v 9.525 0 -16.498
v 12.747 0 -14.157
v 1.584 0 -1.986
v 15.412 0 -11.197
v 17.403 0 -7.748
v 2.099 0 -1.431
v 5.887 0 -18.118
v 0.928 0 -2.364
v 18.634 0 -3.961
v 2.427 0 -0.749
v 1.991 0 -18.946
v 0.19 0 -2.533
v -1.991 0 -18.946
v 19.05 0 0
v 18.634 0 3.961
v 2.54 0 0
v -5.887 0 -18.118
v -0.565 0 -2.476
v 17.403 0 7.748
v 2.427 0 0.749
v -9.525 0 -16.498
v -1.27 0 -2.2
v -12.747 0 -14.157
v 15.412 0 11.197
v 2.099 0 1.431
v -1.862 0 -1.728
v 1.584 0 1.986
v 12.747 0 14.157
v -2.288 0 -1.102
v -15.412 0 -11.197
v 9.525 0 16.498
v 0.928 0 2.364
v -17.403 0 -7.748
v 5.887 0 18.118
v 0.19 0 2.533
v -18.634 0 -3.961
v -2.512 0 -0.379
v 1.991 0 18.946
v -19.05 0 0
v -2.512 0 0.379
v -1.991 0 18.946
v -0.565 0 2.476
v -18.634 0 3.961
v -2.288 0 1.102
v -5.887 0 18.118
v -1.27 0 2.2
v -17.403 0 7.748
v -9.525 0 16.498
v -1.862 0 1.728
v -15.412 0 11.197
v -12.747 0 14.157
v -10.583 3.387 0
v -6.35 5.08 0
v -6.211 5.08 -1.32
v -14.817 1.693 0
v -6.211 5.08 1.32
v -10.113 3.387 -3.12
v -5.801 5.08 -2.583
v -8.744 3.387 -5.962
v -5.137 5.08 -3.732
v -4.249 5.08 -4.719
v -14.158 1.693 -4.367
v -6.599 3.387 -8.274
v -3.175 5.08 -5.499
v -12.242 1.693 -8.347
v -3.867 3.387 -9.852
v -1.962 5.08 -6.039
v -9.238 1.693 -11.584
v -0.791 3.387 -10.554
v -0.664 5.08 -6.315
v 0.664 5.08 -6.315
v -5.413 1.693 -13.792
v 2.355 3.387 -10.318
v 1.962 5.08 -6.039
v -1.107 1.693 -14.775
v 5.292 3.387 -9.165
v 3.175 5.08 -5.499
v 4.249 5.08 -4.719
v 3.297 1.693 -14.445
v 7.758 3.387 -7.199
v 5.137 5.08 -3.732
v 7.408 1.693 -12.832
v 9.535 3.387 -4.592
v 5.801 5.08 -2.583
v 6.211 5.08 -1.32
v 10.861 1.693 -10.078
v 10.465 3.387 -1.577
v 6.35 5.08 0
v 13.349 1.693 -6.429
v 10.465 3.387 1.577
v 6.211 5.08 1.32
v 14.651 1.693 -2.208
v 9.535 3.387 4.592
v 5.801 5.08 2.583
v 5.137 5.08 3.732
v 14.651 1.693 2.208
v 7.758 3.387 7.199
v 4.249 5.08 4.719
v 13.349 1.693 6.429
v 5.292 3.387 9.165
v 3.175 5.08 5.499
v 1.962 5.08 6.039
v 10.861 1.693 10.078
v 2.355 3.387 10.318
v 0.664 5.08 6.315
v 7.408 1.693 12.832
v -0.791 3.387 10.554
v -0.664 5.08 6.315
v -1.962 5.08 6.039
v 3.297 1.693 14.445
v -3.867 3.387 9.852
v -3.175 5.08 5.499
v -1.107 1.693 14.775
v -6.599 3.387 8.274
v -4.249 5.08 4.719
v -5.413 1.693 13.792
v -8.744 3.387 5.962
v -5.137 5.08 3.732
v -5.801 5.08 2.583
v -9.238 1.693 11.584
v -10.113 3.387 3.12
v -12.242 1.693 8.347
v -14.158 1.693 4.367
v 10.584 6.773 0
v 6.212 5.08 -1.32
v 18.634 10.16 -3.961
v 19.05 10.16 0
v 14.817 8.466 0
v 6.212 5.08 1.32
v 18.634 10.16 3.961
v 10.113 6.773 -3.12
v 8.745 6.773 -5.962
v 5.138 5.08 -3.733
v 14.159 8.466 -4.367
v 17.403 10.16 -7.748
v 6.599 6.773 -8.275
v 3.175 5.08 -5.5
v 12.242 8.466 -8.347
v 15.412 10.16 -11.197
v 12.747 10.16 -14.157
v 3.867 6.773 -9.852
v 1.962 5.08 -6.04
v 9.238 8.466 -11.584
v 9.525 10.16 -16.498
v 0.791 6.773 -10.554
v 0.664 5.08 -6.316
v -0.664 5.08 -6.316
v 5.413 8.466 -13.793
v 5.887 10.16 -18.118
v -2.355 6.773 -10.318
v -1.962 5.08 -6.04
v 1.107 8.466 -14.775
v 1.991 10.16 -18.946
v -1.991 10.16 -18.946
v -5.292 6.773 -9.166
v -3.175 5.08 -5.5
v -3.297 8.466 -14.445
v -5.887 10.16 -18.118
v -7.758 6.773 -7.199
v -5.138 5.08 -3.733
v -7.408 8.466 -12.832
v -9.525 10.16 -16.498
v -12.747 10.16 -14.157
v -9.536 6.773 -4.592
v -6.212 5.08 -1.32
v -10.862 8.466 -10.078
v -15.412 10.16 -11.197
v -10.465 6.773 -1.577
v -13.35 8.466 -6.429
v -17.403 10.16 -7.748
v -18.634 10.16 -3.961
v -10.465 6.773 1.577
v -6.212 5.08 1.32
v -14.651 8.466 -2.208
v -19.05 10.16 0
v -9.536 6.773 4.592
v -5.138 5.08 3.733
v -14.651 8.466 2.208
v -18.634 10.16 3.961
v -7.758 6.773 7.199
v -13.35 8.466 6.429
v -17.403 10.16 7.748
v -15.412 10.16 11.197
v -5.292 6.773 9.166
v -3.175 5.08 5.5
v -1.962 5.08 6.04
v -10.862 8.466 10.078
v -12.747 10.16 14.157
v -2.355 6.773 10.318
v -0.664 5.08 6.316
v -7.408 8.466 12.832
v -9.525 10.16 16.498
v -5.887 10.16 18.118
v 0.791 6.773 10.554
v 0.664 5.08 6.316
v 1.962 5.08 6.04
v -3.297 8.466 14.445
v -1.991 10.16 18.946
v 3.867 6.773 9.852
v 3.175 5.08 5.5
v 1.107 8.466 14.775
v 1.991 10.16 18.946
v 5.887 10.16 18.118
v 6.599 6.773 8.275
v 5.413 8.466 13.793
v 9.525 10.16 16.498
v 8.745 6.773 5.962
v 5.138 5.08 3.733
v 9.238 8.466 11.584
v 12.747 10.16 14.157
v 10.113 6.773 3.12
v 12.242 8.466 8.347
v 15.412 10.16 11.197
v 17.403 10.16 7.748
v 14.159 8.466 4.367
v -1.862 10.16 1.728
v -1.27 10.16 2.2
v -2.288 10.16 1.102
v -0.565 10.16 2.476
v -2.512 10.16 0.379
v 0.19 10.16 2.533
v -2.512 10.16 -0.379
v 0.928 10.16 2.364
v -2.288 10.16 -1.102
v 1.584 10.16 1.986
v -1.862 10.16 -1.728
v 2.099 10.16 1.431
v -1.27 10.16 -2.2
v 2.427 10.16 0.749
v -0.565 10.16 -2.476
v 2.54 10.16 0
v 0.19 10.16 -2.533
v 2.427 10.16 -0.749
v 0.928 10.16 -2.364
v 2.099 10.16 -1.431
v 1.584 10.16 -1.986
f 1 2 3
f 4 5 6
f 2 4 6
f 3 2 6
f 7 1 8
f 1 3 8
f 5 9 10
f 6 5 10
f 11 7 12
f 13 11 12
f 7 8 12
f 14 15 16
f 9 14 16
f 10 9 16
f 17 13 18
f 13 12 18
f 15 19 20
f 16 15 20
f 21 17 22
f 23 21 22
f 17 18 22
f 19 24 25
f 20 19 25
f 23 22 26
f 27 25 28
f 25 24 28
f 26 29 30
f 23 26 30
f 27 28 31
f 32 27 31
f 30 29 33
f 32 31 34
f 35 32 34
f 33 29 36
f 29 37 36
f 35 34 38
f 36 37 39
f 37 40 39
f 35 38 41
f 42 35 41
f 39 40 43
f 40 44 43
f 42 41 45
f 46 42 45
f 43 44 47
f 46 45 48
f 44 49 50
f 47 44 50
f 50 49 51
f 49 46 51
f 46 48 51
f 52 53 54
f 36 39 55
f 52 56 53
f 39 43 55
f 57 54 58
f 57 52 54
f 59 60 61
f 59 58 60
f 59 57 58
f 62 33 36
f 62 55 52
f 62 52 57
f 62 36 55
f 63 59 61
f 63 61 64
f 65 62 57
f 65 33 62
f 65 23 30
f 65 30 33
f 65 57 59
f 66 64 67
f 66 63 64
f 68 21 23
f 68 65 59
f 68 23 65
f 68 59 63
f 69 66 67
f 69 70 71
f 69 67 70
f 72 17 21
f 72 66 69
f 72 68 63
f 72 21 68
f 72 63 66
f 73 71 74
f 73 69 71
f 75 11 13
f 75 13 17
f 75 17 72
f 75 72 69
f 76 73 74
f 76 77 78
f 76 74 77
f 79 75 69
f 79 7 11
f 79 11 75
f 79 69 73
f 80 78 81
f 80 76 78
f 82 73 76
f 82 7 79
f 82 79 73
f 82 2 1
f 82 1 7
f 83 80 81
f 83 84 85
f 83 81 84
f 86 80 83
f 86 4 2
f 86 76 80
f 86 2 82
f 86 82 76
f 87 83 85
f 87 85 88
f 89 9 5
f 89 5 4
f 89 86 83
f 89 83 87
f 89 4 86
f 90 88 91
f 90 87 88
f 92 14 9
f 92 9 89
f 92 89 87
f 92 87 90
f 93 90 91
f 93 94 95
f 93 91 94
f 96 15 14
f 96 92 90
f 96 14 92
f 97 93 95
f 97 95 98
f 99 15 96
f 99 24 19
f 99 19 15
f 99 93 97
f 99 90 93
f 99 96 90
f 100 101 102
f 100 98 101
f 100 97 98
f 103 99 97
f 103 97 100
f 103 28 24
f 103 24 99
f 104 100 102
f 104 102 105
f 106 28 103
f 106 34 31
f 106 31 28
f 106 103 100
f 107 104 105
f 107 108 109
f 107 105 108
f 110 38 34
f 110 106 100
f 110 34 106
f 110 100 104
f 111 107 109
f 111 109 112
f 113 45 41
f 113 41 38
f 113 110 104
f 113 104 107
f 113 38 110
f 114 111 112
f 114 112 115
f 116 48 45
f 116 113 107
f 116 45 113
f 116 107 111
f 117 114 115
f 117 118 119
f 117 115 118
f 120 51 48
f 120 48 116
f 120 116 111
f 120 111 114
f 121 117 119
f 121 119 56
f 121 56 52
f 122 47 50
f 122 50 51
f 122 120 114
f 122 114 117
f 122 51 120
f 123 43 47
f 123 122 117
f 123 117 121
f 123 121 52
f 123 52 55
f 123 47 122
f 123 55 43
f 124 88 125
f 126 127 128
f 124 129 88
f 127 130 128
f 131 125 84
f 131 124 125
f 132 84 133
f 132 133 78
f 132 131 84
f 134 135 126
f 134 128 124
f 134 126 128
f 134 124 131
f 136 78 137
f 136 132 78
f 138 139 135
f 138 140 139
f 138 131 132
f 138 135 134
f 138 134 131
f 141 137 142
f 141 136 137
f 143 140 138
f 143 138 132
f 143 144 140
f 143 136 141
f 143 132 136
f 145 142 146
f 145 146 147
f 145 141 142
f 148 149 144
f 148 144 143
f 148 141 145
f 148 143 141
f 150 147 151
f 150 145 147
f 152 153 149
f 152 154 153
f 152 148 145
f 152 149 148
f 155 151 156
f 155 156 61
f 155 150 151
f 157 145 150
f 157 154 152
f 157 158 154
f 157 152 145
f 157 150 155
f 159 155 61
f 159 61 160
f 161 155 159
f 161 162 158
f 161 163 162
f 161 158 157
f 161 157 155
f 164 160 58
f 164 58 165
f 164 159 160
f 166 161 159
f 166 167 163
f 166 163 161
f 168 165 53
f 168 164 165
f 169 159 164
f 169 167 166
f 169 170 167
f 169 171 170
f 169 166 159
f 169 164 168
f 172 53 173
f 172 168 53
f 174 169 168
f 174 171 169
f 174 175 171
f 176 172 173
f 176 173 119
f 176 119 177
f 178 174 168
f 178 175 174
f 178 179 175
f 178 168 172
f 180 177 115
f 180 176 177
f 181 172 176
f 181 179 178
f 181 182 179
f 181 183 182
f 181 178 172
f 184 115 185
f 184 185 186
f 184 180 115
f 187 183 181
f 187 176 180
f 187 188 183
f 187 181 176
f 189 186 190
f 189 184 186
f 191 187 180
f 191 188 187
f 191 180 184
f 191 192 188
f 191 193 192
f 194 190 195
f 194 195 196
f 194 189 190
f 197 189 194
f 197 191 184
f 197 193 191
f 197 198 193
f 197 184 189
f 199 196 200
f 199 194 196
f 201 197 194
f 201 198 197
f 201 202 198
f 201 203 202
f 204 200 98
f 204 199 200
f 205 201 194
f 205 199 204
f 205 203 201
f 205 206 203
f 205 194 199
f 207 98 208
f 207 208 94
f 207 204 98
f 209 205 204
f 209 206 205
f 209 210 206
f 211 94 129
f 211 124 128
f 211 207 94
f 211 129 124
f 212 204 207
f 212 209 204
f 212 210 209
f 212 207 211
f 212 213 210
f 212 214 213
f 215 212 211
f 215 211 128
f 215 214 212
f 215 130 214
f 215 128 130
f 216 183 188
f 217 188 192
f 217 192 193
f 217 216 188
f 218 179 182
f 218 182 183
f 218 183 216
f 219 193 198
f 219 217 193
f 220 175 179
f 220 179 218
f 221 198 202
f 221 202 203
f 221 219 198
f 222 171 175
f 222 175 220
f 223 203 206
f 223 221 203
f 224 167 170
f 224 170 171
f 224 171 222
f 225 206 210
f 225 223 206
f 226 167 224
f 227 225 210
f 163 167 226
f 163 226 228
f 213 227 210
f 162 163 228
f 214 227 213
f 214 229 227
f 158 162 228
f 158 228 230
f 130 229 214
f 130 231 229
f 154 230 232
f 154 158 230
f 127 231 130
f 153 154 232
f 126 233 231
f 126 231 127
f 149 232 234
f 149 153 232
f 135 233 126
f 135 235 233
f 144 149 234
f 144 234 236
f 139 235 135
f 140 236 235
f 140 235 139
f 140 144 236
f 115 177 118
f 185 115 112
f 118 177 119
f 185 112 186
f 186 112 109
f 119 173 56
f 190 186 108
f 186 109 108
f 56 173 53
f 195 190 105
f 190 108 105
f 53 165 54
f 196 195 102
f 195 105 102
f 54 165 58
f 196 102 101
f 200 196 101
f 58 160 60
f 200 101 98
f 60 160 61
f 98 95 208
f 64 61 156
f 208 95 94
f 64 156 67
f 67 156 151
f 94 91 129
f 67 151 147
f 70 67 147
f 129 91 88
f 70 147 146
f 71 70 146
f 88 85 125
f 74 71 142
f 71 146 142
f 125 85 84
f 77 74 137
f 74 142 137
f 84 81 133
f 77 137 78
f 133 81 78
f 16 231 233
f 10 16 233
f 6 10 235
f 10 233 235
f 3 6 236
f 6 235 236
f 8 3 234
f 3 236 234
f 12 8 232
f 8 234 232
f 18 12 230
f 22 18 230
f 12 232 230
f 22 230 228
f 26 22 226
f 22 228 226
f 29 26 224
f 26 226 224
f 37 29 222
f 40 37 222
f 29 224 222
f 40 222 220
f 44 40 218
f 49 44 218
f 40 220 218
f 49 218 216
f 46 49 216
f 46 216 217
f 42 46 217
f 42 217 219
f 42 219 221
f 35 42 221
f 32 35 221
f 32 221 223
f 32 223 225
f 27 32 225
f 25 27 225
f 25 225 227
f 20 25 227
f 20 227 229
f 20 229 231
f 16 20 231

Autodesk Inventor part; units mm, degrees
ref_plane "YZ Plane" through (0, 0, 0) normal (1, 0, 0) x (0, 1, 0)
ref_plane "XZ Plane" through (0, 0, 0) normal (0, 1, 0) x (-1, 0, 0)
ref_plane "XY Plane" through (0, 0, 0) normal (0, 0, 1) x (1, 0, 0)
sketch "Sketch1" plane through (0, 0, 0) normal (0, 1, 0) x (-1, 0, 0)
  circle A0 centre (0, 0) radius 19.05
  dimension "d0" = 38.1
extrude "Extrusion1" add sketch "Sketch1" along normal blind 5.08
chamfer "Chamfer1" distance 12.7 distance2 5.08 1 edges at (19.05, 5.08, 0) measured on face at (1.7089, 5.08, -1.4667)
sketch "Sketch2" plane through (0, 5.08, 0) normal (0, 1, 0) x (1, 0, 0)
  circle A0 centre (0, 0) radius 19.05
  dimension "d6" = 38.1
extrude "Extrusion2" add sketch "Sketch2" along normal blind 5.08
chamfer "Chamfer2" distance 12.7 distance2 5.08 1 edges at (-19.05, 5.08, 0) measured on face at (14.5707, 5.08, 2.0262)
sketch "Sketch5" plane through (0, 10.16, 0) normal (0, 1, 0) x (1, 0, 0)
  circle A0 centre (0, 0) radius 2.54
  dimension "d15" = 5.08
extrude "Extrusion4" cut sketch "Sketch5" against normal blind 10.16
properties part number "Pulley V2"
